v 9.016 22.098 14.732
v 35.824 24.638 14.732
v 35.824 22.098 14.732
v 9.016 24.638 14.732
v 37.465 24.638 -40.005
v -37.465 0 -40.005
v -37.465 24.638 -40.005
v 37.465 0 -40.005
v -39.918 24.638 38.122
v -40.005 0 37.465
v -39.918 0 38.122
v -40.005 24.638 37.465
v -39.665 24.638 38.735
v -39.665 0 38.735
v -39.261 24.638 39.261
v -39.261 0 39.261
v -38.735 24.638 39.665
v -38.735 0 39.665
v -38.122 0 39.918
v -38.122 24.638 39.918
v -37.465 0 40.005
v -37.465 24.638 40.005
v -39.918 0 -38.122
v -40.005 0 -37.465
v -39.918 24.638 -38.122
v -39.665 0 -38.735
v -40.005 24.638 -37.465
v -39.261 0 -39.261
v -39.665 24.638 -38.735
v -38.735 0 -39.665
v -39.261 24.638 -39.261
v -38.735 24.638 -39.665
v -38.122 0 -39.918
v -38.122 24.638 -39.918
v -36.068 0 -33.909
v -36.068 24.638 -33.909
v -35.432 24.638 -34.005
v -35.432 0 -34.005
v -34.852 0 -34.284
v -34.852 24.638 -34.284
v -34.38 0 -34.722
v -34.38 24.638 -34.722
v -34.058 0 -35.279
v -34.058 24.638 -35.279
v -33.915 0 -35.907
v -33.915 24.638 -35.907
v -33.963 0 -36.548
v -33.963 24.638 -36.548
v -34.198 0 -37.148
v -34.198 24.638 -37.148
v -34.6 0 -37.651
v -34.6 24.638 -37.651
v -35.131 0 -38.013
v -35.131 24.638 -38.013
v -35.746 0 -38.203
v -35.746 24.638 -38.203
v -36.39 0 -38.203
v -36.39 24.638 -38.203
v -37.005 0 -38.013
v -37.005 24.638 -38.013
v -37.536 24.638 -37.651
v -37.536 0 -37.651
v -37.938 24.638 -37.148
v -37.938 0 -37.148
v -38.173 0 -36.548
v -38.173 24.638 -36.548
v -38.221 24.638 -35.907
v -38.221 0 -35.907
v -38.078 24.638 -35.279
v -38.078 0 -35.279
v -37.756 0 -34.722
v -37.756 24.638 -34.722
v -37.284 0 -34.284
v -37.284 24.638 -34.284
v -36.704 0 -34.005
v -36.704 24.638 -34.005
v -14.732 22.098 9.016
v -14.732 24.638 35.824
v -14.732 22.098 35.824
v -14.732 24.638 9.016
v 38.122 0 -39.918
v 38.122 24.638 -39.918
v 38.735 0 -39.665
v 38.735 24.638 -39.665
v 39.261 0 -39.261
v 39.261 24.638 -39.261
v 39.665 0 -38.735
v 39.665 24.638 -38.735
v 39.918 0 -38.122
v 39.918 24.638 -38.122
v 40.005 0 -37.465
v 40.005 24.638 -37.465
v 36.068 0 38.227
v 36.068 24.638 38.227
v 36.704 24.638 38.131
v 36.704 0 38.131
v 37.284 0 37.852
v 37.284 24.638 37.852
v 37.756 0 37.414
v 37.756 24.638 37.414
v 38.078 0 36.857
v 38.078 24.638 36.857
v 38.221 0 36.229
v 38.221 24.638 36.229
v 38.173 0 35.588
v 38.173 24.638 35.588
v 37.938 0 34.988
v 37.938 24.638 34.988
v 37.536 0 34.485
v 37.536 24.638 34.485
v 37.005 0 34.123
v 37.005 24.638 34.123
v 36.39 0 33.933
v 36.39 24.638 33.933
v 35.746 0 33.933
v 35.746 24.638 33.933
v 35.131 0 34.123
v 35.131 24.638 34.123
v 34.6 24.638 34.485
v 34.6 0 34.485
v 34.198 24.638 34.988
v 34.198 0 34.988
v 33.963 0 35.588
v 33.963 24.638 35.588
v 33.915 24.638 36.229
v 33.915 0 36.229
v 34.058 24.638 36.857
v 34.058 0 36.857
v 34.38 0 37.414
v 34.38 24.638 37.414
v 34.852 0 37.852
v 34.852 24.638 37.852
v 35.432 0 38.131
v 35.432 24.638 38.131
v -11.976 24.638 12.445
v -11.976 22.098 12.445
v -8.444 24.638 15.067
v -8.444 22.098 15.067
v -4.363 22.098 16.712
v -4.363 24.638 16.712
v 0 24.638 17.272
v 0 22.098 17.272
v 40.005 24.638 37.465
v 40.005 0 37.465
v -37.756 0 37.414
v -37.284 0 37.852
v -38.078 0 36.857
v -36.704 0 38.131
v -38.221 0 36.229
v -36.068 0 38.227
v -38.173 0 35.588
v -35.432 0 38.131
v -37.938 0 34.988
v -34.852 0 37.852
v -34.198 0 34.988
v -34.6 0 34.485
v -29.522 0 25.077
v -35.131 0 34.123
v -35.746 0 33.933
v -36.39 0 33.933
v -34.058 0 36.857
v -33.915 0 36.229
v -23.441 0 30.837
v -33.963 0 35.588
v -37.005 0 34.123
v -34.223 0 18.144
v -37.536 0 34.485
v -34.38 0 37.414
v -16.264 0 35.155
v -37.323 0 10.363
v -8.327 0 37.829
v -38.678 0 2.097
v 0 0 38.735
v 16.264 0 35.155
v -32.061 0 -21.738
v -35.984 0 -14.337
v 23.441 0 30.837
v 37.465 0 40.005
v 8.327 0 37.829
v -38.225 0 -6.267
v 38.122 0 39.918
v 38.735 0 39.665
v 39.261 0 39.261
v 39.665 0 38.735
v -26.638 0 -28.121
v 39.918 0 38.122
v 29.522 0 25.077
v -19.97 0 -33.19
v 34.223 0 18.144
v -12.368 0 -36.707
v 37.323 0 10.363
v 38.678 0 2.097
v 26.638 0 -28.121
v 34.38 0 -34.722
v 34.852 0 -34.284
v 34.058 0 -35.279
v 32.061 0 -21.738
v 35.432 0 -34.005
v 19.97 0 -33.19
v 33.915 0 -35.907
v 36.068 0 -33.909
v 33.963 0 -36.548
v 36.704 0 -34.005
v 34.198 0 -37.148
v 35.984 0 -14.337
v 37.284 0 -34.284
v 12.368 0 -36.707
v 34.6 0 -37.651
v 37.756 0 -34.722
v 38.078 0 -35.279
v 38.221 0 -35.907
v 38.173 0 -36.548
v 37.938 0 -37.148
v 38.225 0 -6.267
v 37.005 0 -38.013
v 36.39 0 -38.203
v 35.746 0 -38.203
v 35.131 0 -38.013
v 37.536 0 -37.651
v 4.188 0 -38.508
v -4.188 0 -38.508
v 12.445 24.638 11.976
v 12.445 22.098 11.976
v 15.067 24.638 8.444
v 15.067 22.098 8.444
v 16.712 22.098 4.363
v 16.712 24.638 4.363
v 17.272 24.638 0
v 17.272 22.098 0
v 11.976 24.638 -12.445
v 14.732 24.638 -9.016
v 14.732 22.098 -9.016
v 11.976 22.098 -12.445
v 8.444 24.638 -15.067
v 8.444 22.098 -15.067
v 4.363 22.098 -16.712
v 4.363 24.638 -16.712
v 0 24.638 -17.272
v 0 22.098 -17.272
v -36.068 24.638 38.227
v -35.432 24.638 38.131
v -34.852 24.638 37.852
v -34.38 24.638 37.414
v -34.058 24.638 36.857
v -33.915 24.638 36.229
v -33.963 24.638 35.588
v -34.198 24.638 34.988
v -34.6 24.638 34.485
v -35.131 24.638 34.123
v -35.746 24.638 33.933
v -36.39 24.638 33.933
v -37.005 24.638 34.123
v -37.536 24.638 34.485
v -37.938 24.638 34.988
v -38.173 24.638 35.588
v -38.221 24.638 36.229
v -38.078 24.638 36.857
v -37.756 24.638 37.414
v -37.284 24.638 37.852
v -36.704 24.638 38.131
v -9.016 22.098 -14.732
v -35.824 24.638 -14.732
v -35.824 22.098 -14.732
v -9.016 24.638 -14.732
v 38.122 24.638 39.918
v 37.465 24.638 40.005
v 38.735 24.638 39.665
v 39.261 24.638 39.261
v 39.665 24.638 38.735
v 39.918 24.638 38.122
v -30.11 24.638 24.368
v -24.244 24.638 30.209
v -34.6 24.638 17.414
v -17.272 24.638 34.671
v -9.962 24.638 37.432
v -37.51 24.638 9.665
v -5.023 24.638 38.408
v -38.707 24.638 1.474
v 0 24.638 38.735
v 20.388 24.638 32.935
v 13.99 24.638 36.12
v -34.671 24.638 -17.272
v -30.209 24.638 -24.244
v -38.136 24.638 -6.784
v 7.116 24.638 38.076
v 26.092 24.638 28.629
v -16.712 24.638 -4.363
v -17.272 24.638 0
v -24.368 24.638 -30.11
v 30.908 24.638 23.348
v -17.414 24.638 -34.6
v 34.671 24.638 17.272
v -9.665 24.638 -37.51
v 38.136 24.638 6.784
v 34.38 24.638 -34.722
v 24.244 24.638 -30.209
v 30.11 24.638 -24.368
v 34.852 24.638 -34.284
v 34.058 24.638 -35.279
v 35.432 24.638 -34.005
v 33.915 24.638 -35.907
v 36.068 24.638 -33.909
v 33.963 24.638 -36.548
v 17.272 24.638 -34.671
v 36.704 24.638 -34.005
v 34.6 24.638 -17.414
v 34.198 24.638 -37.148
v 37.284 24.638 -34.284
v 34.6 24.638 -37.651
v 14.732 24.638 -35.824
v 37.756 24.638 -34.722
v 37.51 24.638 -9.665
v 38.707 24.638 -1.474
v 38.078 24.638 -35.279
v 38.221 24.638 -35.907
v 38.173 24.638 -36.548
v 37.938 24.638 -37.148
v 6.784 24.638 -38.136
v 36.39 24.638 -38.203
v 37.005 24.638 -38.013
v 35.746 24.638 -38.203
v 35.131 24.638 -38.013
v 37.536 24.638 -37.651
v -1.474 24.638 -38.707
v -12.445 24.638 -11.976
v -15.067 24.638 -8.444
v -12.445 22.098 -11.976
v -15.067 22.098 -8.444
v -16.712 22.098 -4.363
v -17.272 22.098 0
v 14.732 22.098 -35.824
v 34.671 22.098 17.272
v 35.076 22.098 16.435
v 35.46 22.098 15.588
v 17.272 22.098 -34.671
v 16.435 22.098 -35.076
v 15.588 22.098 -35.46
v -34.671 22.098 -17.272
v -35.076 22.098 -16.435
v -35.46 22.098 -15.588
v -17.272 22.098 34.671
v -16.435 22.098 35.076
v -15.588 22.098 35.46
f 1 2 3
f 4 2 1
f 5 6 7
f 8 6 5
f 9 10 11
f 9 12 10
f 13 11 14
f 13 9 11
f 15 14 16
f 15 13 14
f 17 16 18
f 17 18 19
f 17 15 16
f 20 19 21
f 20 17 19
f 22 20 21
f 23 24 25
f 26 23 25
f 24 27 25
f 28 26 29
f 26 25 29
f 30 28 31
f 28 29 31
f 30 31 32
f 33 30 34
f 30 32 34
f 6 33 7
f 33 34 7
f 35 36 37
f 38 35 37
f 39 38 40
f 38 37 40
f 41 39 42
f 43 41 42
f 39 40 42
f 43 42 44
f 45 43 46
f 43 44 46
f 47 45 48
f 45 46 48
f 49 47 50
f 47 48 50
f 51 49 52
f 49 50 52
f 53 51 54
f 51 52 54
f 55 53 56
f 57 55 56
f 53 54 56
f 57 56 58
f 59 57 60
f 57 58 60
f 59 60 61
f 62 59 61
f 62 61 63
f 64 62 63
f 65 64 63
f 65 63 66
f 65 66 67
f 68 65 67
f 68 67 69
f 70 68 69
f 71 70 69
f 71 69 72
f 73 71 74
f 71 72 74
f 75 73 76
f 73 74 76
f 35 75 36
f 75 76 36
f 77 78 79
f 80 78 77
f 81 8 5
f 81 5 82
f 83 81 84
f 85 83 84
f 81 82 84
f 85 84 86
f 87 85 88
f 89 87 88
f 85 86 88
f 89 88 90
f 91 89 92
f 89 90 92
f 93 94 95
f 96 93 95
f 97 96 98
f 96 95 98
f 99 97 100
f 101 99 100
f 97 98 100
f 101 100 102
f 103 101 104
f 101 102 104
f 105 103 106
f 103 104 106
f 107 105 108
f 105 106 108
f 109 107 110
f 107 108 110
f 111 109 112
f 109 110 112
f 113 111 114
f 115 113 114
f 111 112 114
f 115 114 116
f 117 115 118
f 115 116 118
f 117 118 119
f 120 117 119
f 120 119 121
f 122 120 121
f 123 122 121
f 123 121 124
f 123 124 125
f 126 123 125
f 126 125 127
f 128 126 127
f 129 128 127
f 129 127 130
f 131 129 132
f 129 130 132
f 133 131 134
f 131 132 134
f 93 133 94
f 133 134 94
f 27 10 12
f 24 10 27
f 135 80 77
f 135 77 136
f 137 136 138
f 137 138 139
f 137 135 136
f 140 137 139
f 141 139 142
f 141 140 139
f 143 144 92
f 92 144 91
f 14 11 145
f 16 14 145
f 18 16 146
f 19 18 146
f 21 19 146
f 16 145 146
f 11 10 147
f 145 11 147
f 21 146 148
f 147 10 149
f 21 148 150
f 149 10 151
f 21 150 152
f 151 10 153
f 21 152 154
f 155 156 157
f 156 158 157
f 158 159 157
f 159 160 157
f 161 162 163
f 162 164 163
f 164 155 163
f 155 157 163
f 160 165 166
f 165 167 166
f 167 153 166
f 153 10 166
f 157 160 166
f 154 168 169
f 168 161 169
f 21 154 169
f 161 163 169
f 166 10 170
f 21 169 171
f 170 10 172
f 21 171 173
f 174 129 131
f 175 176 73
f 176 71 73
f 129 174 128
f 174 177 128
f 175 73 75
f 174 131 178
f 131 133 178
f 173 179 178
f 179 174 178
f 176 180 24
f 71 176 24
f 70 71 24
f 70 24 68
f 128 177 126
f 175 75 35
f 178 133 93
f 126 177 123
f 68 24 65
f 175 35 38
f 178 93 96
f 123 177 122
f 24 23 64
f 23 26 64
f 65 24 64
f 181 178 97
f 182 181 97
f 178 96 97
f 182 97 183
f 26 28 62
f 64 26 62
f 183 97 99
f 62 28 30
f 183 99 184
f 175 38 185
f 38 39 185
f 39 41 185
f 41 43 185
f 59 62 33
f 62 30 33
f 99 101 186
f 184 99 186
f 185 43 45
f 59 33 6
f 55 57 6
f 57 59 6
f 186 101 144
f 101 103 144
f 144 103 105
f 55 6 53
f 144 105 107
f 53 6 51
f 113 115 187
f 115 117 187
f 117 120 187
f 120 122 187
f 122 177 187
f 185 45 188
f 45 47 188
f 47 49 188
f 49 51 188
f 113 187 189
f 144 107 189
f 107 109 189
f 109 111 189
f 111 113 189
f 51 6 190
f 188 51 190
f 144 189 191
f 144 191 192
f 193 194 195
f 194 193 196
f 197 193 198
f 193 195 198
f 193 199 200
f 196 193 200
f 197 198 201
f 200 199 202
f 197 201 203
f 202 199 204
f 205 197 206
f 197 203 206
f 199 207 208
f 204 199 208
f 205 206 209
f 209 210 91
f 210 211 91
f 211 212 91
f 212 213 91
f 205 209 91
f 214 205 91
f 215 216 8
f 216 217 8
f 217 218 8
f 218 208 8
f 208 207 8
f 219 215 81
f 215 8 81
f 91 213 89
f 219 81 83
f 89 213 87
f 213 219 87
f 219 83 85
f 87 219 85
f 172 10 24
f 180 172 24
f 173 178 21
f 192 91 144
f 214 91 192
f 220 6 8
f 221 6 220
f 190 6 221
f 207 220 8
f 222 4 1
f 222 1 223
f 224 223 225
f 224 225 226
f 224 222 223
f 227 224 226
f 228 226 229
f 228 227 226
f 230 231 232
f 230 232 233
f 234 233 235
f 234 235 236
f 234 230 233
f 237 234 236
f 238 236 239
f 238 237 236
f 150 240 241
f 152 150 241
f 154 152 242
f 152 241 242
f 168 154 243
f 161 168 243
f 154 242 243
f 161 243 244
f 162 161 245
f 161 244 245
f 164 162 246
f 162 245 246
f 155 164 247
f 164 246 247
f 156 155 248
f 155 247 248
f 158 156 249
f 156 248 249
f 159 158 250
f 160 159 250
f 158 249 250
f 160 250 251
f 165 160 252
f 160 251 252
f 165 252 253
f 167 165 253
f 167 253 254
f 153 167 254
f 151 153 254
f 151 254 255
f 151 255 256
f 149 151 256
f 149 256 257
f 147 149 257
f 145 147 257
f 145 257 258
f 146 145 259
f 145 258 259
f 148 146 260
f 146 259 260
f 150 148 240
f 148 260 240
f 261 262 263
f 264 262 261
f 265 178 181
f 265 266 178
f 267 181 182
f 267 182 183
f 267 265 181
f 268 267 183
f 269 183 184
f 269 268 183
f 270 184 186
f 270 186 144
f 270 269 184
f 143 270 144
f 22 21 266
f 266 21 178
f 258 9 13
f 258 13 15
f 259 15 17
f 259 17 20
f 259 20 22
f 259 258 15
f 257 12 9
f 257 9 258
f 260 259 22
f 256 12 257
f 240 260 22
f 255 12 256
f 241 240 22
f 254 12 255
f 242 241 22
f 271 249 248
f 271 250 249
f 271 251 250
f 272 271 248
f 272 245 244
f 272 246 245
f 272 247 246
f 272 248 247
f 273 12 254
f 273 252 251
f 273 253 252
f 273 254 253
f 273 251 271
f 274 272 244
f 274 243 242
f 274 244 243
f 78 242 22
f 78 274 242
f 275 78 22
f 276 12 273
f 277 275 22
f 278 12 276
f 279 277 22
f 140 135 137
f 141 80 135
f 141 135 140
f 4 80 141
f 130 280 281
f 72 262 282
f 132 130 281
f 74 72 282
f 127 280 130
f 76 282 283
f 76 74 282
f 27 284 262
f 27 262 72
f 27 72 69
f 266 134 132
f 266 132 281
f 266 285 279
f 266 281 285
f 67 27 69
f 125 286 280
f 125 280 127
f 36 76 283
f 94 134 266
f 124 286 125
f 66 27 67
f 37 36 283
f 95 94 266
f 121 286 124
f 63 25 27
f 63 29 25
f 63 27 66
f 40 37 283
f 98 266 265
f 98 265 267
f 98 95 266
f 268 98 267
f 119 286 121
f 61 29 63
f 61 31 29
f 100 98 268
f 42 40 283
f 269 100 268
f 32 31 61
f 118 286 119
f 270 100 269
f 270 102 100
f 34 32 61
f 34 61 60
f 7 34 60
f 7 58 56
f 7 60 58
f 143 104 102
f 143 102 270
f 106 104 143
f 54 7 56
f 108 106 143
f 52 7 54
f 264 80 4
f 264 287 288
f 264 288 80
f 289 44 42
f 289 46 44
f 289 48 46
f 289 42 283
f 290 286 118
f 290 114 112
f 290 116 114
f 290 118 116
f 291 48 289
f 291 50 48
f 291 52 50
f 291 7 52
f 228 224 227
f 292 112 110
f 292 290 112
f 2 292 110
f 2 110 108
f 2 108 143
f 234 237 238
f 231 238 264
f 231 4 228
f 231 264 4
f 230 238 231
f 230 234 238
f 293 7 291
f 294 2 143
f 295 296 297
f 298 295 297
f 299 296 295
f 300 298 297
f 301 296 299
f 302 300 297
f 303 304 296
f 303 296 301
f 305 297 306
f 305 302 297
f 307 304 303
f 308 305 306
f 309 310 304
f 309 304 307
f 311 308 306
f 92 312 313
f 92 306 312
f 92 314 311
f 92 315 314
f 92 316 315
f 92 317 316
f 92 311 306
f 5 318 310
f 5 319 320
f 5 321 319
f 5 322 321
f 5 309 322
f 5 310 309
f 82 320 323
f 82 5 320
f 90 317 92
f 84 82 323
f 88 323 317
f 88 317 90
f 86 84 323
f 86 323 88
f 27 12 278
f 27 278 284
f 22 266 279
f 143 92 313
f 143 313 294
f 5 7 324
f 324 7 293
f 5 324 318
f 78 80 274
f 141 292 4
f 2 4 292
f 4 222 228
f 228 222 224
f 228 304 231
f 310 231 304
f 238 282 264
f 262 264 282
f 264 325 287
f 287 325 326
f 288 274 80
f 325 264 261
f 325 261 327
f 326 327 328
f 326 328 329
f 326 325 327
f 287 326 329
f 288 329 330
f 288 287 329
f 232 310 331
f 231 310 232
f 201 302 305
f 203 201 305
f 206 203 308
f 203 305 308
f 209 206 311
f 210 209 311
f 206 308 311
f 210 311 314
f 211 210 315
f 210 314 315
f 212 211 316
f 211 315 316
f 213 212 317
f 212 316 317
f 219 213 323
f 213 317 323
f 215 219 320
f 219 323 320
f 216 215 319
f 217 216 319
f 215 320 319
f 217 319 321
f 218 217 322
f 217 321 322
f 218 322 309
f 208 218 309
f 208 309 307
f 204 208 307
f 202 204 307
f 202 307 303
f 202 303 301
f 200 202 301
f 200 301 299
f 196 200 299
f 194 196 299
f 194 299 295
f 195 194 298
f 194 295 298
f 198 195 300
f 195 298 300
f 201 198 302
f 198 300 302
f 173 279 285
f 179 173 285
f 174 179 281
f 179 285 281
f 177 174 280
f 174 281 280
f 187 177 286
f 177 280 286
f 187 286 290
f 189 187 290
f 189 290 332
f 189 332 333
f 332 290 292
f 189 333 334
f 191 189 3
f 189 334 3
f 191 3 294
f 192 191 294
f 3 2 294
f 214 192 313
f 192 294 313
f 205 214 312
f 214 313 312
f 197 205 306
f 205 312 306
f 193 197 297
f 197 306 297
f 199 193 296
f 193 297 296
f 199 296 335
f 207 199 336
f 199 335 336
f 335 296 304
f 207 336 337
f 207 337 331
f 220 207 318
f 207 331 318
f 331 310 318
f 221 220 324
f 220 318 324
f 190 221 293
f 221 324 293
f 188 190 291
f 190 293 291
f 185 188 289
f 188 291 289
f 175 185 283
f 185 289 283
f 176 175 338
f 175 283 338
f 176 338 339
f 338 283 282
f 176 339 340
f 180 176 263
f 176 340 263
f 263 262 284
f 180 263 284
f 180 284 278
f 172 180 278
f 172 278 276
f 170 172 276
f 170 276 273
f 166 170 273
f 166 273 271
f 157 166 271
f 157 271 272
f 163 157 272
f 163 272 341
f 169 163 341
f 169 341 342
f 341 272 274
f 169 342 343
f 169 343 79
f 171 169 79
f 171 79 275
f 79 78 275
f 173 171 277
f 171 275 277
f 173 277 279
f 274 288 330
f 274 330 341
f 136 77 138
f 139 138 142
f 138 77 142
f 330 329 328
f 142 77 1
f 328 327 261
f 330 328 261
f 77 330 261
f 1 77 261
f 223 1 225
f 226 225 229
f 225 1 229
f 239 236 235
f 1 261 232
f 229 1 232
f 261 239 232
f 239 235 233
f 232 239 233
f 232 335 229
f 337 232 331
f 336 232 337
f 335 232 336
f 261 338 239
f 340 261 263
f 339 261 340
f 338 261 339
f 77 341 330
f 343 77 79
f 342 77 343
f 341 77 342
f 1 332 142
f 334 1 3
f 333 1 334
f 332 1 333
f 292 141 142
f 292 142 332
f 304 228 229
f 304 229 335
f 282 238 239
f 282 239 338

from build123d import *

# Parameters (mm, degrees)
SKETCH1_W           = 80.01
SKETCH1_H           = 80.01
BOSS_EXTRUDE1_DEPTH = 24.638
SKETCH2_R           = 38.735
SKETCH2_R_2         = 2.159
CUT_EXTRUDE1_DEPTH  = 24.638
FILLET1_R           = 2.54
BOSS_EXTRUDE2_DEPTH = 2.54


with BuildPart() as part:
    # Sketch1 → Boss-Extrude1 (new body)
    with BuildSketch(Plane(origin=(0, 0, 0), x_dir=(1, 0, 0), z_dir=(0, 1, 0))):
        Rectangle(SKETCH1_W, SKETCH1_H)
    extrude(amount=BOSS_EXTRUDE1_DEPTH)

    # Sketch2 → Cut-Extrude1 (cut)
    with BuildSketch(Plane(origin=(0, 24.638, 0), x_dir=(1, 0, 0), z_dir=(0, 1, 0))):
        with Locations(Location((0, 0, 0), (0, 0, 270))):
            Circle(SKETCH2_R)
        with Locations(Location((-36.068, 36.068, 0), (0, 0, 270))):
            Circle(SKETCH2_R_2)
        with Locations(Location((36.068, 36.068, 0), (0, 0, 270))):
            Circle(SKETCH2_R_2)
        with Locations(Location((36.068, -36.068, 0), (0, 0, 270))):
            Circle(SKETCH2_R_2)
        with Locations(Location((-36.068, -36.068, 0), (0, 0, 270))):
            Circle(SKETCH2_R_2)
    extrude(amount=-CUT_EXTRUDE1_DEPTH, mode=Mode.SUBTRACT)

    # Fillet1
    fillet1_edges = [part.edges().sort_by_distance(p)[0] for p in [
        (40.005, 12.319, 40.005),
        (-40.005, 12.319, 40.005),
        (-40.005, 12.319, -40.005),
        (40.005, 12.319, -40.005),
    ]]
    fillet(fillet1_edges, radius=FILLET1_R)

    # Sketch3 → Boss-Extrude2 (add)
    with BuildSketch(Plane(origin=(0, 24.638, 0), x_dir=(1, 0, 0), z_dir=(0, 1, 0))):
        with BuildLine():
            Line((17.272, 0), (17.272, 34.671))
            ThreePointArc((17.272, 34.671), (16.01238371, 35.270437946), (14.732, 35.824131546))
            Line((14.732, 35.824131546), (14.732, 9.016105589))
            ThreePointArc((14.732, 9.016105589), (8.443808627, 15.067318271), (0, 17.272))
            Line((0, 17.272), (-34.671, 17.272))
            ThreePointArc((-34.671, 17.272), (-35.270437946, 16.01238371), (-35.824131546, 14.732))
            Line((-35.824131546, 14.732), (-9.016105589, 14.732))
            ThreePointArc((-9.016105589, 14.732), (-15.067318271, 8.443808627), (-17.272, 0))
            Line((-17.272, 0), (-17.272, -34.671))
            ThreePointArc((-17.272, -34.671), (-16.01238371, -35.270437946), (-14.732, -35.824131546))
            Line((-14.732, -35.824131546), (-14.732, -9.016105589))
            ThreePointArc((-14.732, -9.016105589), (-8.443808627, -15.067318271), (0, -17.272))
            Line((0, -17.272), (34.671, -17.272))
            ThreePointArc((34.671, -17.272), (35.270437946, -16.01238371), (35.824131546, -14.732))
            Line((35.824131546, -14.732), (9.016105589, -14.732))
            ThreePointArc((9.016105589, -14.732), (15.067318271, -8.443808627), (17.272, 0))
        make_face()
    extrude(amount=-BOSS_EXTRUDE2_DEPTH)


solid = part.part
